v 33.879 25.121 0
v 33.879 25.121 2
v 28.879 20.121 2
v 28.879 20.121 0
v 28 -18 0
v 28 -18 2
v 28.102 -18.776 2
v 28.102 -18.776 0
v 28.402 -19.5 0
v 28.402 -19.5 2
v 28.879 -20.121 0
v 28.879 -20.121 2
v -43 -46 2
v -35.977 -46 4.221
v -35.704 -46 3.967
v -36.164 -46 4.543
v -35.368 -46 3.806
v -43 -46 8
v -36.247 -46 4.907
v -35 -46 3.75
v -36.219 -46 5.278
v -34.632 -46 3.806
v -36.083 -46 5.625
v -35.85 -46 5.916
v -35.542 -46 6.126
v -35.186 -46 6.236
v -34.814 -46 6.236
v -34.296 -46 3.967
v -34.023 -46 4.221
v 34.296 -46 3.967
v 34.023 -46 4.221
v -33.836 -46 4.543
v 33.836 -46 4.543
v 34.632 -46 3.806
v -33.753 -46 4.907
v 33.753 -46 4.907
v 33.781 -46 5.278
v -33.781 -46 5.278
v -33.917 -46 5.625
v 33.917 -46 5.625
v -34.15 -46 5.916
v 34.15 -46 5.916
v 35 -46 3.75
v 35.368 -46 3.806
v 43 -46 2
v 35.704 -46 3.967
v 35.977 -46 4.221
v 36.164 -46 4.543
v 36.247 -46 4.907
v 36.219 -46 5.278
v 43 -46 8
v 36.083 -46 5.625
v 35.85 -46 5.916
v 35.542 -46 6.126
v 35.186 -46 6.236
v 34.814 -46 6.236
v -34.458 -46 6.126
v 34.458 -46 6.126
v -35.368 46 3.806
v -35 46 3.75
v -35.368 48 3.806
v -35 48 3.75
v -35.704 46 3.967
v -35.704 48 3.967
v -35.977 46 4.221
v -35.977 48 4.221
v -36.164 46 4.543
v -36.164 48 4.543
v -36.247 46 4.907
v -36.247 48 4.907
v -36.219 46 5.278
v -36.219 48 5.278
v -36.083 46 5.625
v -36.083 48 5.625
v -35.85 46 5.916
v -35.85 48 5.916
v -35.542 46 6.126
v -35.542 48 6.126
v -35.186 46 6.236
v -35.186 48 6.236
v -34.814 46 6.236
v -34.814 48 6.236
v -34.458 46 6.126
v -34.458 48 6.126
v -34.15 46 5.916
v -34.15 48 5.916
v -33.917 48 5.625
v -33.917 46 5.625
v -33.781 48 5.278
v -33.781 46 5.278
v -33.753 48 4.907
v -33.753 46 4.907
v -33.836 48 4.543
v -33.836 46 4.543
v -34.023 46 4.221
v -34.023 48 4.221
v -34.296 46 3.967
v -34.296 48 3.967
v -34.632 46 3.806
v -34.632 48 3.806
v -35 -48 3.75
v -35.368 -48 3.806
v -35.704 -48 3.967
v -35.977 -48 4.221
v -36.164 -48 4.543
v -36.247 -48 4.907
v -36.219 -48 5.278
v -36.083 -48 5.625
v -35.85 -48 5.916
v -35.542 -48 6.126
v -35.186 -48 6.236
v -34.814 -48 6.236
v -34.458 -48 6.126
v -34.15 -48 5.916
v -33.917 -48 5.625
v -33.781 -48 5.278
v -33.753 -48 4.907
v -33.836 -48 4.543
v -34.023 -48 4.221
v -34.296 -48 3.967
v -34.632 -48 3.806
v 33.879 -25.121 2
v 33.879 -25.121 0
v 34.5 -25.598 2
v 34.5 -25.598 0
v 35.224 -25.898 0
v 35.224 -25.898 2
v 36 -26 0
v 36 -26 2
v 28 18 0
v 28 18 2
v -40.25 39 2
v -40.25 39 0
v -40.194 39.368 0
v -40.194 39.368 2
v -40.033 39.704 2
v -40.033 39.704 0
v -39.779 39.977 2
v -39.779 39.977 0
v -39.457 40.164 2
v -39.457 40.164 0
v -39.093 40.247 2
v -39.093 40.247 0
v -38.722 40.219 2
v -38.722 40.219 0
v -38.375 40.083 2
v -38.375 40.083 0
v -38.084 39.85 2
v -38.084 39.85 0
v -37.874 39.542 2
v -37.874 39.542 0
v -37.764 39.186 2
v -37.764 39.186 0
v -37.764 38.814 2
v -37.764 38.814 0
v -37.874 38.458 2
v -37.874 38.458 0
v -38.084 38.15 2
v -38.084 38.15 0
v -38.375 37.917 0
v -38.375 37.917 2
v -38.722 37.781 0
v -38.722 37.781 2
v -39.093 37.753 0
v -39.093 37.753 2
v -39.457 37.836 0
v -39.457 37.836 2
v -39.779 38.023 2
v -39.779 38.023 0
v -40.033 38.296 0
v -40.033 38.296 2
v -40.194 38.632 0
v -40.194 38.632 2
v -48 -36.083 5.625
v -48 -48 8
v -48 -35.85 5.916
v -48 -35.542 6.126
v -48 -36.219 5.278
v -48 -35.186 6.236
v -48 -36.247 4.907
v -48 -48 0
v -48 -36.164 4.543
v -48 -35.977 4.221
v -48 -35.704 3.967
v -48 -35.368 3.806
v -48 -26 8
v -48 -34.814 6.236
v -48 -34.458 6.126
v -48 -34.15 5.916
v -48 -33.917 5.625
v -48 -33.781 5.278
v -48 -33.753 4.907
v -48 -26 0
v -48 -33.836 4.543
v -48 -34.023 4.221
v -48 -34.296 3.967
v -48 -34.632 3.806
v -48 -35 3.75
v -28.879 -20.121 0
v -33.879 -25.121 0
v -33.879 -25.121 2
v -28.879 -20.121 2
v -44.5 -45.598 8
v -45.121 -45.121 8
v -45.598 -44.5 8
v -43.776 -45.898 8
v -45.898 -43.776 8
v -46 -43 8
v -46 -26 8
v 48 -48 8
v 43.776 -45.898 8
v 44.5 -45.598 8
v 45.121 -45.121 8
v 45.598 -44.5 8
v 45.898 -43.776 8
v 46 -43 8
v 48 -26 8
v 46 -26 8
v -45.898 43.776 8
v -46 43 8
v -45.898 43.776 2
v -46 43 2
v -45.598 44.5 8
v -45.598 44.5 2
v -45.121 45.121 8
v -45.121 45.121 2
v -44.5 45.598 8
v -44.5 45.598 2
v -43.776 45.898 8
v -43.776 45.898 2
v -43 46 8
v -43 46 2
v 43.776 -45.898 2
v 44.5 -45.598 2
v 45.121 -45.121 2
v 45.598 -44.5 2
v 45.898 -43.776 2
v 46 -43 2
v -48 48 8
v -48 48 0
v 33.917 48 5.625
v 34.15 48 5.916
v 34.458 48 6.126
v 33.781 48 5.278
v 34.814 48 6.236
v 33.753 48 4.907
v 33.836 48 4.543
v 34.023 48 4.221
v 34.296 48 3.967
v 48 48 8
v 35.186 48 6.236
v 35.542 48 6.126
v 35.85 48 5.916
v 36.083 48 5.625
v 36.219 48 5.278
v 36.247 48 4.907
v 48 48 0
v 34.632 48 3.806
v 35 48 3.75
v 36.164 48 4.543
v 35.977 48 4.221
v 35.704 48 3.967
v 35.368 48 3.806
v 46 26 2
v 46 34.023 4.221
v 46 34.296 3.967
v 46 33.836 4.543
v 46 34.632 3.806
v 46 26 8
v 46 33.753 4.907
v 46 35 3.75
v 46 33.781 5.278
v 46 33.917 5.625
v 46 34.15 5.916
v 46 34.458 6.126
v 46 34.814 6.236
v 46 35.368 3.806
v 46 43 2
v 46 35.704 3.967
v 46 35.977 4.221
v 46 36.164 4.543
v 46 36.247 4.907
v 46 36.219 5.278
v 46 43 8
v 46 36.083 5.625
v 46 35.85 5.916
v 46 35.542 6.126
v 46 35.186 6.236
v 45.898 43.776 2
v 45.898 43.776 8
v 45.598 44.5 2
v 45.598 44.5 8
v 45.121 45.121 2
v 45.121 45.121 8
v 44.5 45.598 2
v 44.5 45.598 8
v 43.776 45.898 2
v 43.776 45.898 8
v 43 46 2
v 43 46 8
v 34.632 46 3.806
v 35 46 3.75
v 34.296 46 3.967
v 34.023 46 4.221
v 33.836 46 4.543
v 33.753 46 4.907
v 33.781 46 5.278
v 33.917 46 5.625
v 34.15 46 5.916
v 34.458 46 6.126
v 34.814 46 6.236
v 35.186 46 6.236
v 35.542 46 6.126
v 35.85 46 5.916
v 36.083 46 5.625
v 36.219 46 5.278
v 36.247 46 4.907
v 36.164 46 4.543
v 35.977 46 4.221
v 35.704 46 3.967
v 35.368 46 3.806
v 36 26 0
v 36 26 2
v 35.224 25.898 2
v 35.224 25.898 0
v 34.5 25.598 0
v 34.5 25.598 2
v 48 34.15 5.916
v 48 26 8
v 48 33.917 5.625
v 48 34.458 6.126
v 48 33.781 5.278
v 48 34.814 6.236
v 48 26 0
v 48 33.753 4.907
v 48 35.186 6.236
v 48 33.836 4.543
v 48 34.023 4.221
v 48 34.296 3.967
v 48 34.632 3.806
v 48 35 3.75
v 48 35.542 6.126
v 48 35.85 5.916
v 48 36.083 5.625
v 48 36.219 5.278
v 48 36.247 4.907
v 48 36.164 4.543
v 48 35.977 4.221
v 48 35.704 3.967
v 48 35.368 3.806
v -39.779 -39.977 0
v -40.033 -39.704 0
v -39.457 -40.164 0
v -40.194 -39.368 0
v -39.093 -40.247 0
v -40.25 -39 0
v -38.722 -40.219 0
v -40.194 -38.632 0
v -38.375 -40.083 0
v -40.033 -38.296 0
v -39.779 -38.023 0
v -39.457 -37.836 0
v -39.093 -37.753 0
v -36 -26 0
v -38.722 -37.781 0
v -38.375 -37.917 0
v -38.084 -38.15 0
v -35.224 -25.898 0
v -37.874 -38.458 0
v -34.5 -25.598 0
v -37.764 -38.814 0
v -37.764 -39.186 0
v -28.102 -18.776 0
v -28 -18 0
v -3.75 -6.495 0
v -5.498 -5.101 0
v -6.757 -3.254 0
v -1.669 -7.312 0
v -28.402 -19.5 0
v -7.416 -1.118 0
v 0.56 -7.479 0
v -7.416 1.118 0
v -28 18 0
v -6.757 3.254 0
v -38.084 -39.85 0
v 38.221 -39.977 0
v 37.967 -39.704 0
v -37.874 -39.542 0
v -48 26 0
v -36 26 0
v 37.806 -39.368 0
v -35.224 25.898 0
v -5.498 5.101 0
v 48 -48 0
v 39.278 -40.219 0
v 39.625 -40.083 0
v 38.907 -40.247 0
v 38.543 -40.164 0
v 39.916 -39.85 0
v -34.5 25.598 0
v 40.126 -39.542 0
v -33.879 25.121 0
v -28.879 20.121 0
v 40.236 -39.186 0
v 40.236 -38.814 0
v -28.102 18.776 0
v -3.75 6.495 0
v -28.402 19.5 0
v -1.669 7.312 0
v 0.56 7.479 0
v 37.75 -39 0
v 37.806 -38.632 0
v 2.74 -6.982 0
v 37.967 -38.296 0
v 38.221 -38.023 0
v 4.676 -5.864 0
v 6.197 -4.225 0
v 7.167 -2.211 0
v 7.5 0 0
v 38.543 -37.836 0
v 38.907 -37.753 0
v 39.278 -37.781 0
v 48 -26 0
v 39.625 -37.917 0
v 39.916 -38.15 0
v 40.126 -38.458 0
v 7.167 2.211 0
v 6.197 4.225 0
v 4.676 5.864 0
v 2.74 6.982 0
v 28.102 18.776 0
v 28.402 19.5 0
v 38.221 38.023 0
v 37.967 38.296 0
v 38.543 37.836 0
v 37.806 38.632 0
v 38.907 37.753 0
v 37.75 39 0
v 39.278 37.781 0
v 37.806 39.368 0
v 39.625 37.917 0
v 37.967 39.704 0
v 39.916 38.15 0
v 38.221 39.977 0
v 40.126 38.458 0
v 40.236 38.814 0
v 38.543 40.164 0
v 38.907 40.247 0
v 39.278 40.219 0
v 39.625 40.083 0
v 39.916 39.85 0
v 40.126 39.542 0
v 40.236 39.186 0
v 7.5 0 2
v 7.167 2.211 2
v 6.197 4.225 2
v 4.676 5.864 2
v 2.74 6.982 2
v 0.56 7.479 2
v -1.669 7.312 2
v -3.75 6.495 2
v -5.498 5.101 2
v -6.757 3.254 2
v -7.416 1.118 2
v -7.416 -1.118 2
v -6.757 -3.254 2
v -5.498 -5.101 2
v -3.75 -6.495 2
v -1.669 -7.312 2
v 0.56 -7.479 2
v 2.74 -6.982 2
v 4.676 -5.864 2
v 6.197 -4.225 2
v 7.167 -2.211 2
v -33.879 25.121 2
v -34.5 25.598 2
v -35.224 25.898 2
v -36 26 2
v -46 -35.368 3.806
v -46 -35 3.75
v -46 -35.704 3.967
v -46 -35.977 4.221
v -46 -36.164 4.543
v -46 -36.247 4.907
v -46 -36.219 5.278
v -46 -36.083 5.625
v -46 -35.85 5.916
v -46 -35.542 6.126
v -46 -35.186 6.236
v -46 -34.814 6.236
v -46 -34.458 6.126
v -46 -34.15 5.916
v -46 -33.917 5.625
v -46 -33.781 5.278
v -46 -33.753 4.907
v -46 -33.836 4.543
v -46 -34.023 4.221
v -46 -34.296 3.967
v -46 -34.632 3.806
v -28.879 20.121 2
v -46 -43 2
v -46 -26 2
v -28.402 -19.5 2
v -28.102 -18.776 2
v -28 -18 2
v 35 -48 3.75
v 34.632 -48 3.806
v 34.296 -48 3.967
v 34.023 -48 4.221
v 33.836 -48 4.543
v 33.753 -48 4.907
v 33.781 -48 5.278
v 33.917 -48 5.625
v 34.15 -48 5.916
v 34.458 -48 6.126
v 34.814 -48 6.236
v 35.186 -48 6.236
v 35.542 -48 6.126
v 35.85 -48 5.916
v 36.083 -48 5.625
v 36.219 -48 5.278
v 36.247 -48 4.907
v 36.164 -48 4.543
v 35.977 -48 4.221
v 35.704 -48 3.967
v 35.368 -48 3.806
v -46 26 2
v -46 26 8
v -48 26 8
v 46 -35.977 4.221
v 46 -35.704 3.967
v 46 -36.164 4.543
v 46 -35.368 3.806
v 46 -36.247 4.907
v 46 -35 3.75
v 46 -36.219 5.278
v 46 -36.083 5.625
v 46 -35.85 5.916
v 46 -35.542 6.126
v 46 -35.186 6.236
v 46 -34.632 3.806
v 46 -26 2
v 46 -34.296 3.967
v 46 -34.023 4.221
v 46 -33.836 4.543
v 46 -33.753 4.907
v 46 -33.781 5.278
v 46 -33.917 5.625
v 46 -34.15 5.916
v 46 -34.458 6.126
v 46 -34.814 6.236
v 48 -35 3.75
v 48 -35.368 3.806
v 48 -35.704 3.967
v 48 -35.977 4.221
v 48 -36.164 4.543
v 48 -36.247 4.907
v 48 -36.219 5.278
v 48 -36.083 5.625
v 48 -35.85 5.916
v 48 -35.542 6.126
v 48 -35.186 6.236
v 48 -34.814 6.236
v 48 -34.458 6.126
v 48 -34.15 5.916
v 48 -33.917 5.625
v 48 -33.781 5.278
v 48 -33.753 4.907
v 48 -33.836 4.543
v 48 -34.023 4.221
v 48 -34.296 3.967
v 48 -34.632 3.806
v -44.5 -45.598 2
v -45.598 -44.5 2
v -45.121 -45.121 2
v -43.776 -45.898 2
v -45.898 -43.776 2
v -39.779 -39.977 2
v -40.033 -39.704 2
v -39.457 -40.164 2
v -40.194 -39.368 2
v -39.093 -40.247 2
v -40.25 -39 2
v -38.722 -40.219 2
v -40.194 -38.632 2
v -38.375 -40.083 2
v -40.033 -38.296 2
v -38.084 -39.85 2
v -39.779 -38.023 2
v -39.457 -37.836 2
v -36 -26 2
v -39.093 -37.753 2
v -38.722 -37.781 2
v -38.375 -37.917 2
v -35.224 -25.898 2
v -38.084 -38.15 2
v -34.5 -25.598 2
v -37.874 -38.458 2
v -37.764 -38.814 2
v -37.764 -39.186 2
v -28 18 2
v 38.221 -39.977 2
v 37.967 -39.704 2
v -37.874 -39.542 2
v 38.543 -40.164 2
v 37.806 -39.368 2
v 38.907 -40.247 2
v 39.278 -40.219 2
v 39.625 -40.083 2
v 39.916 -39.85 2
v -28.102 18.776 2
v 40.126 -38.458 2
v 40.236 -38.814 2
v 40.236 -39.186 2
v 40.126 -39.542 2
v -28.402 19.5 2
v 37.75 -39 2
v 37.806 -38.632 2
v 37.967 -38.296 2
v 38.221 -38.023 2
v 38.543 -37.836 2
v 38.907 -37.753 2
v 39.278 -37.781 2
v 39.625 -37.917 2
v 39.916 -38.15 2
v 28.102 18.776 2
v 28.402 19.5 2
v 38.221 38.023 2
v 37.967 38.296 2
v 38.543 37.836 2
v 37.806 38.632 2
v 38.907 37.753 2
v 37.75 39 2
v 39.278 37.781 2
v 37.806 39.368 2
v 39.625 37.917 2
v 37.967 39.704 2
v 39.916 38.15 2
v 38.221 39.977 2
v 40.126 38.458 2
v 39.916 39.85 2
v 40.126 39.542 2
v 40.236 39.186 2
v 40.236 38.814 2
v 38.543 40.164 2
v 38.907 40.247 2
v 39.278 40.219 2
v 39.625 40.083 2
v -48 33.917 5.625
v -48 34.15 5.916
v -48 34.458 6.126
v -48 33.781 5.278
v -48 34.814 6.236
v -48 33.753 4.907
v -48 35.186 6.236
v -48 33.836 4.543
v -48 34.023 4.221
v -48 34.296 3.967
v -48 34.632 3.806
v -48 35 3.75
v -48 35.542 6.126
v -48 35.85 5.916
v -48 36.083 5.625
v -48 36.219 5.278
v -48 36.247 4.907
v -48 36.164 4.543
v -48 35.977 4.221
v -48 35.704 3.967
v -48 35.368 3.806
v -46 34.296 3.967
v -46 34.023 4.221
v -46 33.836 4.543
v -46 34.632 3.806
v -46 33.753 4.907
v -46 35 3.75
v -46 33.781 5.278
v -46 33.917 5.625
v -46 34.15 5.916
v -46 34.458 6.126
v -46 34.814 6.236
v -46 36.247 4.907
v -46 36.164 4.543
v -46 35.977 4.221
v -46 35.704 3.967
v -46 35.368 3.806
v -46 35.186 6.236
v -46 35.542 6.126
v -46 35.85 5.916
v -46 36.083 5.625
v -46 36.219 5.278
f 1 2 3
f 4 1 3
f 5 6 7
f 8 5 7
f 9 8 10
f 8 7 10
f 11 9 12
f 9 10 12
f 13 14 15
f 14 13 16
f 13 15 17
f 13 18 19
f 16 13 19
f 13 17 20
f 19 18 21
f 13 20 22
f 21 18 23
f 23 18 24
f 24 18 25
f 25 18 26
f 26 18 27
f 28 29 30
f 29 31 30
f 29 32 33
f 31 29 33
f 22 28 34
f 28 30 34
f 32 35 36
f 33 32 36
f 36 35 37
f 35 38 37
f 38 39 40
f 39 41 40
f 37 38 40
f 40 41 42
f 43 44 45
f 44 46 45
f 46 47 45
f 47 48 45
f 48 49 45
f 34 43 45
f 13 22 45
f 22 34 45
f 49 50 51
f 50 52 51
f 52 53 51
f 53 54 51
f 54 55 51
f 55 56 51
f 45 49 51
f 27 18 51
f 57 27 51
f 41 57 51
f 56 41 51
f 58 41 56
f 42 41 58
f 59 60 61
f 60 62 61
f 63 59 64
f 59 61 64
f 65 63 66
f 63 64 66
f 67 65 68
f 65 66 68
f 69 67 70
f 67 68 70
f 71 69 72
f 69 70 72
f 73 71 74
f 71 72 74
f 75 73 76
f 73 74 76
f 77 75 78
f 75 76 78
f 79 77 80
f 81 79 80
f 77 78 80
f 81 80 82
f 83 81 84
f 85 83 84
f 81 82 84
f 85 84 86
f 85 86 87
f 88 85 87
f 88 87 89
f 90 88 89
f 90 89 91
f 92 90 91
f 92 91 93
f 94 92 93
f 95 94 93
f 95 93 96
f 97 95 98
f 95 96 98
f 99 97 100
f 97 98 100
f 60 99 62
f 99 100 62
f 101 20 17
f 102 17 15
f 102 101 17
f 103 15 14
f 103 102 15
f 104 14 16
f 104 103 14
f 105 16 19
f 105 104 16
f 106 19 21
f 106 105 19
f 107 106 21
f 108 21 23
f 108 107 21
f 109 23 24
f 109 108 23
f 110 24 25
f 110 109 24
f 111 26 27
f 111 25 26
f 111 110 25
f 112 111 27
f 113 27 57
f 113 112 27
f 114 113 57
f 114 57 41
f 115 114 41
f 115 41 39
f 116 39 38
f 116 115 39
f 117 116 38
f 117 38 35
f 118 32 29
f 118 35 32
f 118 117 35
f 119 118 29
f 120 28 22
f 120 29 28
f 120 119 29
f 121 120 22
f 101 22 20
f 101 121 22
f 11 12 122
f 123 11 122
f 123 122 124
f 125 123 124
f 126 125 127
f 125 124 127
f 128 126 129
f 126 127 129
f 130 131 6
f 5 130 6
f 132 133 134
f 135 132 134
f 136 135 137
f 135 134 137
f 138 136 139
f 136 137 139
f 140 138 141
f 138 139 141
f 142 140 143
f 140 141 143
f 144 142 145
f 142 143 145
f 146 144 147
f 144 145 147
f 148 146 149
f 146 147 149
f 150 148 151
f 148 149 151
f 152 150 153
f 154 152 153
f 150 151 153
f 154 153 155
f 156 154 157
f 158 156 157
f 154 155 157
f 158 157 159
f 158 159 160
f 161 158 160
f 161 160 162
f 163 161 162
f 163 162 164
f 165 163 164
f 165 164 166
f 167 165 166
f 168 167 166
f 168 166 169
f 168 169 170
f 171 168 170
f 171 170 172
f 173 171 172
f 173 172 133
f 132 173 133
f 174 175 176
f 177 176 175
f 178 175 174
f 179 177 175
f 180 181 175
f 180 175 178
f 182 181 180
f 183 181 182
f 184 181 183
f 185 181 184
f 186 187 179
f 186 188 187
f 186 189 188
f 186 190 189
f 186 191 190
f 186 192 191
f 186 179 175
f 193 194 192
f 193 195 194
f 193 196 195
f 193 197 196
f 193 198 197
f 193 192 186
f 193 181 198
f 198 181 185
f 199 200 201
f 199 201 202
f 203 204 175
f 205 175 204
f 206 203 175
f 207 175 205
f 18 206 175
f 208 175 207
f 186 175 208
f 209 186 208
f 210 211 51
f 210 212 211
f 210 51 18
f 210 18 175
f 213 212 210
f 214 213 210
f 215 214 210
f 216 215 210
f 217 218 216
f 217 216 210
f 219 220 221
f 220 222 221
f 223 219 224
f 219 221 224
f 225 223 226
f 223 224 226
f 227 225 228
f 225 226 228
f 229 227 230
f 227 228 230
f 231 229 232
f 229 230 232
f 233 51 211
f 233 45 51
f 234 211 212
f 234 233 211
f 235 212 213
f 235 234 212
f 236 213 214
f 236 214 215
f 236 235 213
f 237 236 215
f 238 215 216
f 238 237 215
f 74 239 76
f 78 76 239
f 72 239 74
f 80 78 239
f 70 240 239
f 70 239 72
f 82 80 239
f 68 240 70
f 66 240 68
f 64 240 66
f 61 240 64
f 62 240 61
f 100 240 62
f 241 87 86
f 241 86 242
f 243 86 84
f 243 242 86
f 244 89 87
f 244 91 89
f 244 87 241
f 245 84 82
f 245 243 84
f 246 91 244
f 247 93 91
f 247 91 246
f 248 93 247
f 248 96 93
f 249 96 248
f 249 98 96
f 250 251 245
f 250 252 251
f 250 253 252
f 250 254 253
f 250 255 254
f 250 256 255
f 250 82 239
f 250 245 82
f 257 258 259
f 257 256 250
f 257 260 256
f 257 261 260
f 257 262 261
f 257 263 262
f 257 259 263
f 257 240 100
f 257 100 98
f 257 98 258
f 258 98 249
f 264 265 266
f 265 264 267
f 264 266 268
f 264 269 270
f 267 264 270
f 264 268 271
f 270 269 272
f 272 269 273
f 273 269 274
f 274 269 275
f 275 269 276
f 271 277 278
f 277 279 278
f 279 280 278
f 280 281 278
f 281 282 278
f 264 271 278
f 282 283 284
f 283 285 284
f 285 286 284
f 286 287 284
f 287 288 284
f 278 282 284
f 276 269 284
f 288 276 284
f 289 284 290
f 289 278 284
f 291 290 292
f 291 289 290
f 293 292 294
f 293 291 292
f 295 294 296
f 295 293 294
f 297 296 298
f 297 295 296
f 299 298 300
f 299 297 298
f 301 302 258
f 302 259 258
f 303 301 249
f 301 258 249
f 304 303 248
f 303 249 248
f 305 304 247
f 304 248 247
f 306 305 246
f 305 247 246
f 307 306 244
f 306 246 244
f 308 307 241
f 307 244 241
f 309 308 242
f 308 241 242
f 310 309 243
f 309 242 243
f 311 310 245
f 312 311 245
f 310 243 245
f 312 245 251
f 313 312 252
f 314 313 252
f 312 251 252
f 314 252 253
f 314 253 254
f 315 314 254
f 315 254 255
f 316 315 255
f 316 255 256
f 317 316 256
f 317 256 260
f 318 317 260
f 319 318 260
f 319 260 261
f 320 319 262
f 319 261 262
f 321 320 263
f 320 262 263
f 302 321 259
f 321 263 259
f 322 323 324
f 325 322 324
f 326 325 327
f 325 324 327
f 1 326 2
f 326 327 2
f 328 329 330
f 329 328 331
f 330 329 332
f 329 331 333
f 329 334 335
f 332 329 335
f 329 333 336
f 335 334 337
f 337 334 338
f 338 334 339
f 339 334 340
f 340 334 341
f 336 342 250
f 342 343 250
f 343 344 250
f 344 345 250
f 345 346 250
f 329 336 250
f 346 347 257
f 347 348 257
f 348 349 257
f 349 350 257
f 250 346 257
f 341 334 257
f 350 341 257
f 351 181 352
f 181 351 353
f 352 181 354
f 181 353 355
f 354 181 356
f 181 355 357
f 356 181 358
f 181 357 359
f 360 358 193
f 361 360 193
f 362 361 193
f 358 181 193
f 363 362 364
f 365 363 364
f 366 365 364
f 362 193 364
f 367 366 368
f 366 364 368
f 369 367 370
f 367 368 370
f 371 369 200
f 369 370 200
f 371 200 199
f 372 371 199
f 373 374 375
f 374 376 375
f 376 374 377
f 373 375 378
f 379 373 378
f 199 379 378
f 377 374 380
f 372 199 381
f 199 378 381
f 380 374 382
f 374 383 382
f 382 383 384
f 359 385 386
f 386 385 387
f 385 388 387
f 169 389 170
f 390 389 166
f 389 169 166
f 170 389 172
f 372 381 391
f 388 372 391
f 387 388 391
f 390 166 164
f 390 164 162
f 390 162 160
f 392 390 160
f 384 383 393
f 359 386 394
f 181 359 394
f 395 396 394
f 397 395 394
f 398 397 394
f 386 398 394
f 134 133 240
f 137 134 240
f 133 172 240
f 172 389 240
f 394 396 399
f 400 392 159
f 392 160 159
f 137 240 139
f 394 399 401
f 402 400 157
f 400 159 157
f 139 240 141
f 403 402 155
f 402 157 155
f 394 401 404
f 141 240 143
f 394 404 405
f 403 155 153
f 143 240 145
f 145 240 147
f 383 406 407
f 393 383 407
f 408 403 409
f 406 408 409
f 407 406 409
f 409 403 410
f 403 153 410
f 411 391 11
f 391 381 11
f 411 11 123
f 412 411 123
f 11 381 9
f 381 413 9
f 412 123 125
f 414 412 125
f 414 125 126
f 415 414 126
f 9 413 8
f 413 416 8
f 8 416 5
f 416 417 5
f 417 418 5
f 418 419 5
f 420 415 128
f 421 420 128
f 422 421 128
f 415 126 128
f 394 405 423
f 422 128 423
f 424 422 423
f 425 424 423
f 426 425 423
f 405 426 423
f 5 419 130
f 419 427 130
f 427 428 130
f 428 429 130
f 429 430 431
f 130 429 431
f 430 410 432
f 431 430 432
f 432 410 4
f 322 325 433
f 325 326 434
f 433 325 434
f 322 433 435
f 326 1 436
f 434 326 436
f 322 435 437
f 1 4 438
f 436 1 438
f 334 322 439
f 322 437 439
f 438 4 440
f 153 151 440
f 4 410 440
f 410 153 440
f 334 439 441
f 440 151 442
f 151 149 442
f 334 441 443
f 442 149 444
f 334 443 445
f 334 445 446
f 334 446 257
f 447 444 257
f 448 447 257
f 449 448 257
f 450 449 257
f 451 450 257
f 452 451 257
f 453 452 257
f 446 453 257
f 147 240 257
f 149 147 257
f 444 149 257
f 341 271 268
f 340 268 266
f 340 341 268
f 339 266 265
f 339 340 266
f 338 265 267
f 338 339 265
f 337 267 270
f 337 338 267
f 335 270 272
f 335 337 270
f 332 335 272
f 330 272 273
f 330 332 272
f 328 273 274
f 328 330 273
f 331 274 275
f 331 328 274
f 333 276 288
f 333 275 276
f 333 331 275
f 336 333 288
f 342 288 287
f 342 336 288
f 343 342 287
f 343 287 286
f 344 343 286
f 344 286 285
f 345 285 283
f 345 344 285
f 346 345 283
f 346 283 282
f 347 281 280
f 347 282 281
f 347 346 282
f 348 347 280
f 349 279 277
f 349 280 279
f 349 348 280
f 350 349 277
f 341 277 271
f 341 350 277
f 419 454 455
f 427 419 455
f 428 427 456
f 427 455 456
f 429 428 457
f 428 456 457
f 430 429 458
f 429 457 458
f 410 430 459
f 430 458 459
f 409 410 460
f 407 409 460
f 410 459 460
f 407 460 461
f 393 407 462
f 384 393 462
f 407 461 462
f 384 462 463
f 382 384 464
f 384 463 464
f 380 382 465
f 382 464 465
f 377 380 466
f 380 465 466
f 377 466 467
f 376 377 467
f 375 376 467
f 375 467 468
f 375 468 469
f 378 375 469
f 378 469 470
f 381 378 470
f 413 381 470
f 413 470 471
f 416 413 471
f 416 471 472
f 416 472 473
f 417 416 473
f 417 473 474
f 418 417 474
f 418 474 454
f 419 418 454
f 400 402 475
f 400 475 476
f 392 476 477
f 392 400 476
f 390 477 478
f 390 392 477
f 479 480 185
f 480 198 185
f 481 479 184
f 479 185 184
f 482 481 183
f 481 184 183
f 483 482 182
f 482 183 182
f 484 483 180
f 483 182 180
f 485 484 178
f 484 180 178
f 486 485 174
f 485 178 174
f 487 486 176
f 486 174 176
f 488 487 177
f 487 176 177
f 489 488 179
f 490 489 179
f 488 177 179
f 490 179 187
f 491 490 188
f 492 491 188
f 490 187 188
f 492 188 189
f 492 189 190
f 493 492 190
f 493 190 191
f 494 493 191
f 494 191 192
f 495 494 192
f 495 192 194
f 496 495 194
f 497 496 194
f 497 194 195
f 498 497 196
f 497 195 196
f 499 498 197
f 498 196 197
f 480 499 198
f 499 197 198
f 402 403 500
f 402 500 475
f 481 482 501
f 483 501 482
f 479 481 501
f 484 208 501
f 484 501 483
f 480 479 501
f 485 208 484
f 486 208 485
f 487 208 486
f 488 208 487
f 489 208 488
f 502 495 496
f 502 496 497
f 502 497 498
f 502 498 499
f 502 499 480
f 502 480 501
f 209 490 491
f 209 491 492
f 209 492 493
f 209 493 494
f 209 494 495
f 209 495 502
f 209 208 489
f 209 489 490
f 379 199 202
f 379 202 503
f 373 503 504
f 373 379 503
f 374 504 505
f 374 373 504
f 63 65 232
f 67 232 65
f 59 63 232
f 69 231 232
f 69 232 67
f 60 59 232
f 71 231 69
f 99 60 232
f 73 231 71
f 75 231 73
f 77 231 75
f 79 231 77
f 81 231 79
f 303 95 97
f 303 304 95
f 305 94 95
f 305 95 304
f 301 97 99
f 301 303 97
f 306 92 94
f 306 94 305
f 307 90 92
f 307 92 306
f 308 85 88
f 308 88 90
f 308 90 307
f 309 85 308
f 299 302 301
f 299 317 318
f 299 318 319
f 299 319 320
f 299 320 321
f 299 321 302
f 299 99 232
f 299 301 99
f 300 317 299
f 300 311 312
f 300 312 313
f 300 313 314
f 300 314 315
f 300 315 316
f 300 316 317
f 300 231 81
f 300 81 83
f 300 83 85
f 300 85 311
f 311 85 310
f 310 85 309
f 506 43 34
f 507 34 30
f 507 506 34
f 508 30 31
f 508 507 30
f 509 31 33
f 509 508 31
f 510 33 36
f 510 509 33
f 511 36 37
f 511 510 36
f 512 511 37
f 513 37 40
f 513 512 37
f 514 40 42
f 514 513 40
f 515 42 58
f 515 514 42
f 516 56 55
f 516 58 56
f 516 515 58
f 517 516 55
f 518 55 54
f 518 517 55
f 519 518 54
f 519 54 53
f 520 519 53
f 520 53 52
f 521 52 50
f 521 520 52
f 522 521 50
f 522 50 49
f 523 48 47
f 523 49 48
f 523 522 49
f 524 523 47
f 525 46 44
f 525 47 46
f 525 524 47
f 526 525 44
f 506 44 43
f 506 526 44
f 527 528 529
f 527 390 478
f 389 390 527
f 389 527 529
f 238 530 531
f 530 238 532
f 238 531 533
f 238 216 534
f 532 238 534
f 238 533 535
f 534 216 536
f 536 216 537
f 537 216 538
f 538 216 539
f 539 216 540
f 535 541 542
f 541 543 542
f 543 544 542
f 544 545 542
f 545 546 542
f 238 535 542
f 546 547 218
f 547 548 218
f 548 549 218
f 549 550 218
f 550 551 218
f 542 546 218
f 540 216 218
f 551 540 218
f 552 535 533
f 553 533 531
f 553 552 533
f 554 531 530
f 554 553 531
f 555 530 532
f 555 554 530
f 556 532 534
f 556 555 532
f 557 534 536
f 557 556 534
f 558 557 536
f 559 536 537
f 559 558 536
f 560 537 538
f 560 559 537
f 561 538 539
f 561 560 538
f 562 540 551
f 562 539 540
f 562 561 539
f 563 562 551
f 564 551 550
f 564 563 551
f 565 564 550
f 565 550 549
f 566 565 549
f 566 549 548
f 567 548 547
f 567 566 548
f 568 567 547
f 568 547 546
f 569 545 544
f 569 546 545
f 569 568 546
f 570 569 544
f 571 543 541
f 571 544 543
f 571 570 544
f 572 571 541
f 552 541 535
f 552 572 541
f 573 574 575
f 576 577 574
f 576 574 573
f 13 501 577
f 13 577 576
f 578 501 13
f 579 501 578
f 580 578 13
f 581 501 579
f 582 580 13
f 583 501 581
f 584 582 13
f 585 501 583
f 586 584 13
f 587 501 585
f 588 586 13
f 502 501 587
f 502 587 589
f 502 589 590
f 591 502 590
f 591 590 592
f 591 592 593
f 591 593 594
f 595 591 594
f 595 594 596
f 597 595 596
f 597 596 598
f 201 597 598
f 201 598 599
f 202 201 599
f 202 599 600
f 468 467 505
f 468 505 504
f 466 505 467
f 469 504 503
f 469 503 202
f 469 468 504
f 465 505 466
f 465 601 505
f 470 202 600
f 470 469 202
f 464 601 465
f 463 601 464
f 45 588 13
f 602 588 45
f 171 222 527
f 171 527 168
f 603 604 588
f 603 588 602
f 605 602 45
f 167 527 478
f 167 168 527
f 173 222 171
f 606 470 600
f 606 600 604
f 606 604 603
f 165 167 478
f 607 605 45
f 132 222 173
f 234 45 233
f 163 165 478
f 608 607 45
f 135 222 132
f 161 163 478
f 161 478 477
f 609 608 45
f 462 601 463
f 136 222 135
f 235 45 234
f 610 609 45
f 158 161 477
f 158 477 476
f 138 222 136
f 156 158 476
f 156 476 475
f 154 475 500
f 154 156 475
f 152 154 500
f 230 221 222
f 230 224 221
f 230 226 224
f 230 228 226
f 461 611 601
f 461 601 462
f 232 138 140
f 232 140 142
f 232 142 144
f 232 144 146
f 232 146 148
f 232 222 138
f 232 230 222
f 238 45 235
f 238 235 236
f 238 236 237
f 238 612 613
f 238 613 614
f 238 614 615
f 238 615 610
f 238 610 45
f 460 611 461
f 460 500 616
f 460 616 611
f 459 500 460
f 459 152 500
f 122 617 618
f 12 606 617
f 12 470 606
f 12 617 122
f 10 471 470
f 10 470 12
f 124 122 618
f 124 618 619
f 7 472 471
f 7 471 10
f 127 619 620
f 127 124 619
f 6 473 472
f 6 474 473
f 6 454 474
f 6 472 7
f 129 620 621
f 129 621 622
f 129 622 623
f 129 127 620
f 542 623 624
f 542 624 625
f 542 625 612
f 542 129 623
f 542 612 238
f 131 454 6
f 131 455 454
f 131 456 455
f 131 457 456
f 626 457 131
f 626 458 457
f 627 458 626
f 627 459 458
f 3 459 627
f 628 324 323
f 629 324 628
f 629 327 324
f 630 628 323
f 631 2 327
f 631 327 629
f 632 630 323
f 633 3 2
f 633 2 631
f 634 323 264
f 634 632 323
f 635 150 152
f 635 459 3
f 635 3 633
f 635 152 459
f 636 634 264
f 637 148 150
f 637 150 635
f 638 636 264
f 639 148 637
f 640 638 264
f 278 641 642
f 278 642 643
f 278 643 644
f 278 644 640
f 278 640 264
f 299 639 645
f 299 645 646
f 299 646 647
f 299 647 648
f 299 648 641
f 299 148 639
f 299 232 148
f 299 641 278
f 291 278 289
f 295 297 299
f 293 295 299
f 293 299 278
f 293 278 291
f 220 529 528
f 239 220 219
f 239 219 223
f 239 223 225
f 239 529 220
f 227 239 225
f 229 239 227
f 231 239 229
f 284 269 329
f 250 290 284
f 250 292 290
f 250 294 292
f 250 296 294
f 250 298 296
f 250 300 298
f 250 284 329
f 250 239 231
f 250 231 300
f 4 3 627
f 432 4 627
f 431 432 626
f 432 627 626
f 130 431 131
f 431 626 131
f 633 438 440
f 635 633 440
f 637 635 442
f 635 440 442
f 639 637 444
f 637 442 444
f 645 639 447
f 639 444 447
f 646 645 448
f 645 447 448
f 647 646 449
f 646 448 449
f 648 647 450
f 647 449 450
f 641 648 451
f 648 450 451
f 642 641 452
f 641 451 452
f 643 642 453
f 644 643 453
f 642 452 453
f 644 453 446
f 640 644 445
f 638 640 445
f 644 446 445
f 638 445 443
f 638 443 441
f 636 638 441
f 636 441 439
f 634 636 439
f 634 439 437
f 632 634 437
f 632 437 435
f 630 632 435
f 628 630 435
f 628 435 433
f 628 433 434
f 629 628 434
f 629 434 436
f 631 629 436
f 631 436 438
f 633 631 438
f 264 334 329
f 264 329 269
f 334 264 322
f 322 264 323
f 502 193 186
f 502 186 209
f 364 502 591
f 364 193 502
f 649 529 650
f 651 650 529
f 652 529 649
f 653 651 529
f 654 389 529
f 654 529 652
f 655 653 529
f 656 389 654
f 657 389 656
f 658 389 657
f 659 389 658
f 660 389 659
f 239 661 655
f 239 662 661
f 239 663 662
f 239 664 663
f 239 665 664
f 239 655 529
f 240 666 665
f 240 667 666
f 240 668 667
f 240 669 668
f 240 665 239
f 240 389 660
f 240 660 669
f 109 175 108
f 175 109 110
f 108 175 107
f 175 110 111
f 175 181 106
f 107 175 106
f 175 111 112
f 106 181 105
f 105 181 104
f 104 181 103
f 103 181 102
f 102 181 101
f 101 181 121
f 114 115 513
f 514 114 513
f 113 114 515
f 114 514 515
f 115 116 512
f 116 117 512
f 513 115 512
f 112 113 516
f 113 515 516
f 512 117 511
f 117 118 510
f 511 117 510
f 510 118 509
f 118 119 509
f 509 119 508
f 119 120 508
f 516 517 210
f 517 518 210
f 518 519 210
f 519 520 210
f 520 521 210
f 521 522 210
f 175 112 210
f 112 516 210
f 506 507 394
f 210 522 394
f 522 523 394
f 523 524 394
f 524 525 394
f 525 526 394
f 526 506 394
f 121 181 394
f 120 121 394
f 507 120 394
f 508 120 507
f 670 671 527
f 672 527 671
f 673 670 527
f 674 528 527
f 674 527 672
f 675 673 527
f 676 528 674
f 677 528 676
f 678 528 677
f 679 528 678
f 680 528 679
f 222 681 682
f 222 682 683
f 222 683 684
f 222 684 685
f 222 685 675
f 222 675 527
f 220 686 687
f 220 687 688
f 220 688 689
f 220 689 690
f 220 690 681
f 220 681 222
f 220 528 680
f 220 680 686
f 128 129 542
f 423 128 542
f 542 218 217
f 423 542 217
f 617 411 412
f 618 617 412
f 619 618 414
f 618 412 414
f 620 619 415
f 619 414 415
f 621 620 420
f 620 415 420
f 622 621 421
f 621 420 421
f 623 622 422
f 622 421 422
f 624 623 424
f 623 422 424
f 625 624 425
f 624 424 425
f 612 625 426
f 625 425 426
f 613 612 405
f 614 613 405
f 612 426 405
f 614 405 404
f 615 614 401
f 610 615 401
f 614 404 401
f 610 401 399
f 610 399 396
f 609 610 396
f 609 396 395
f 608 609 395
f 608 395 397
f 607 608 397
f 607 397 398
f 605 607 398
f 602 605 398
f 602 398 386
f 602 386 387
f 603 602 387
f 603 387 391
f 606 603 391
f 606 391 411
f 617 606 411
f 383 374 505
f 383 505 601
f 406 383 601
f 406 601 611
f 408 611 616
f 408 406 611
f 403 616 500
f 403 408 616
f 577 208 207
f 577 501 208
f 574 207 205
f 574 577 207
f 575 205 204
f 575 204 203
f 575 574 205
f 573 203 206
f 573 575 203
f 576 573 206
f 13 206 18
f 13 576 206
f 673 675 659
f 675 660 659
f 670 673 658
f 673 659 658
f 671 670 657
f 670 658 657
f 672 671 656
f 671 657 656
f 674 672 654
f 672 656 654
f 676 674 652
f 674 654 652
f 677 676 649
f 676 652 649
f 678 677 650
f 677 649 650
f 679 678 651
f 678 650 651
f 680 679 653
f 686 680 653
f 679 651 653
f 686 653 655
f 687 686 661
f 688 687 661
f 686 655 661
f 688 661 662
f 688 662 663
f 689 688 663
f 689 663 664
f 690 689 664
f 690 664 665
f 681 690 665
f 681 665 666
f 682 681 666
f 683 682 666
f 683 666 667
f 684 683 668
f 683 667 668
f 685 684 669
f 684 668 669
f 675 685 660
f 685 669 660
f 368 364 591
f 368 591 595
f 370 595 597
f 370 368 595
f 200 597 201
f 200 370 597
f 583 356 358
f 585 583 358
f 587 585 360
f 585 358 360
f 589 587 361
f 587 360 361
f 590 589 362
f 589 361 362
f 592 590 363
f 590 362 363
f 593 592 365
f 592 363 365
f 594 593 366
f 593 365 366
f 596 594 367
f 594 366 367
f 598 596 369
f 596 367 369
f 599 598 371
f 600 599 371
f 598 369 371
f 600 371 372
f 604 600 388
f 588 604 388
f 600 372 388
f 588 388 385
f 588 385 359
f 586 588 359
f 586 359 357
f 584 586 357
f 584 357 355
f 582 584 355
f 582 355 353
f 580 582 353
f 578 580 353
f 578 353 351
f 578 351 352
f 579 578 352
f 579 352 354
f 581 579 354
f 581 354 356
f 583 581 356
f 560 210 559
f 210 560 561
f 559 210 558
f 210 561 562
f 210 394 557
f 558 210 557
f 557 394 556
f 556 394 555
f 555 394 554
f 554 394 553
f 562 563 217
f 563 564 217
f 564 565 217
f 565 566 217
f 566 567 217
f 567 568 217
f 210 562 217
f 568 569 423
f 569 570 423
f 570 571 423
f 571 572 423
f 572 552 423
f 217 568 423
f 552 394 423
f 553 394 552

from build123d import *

# Parameters (mm, degrees)
SKETCH1_W                      = 96
SKETCH1_H                      = 96
BOSS_EXTRUDE1_DEPTH            = 8
SKETCH2_W                      = 92
SKETCH2_H                      = 92
COMPONENT_PLATFORM_DEPTH       = 6
CABLE_SLOTS_DEPTH              = 6
SKETCH4_R                      = 7.5
CENTER_MASS_CUT_DEPTH          = 6
INNER_CORNER_FILLETS_R         = 3
M3X0_5_TAPPED_HOLE1_AT_2_COUNT = 2
M3X0_5_TAPPED_HOLE1_AT_2_PITCH = 70
M3X0_5_TAPPED_HOLE2_AT_2_COUNT = 2
M3X0_5_TAPPED_HOLE2_AT_2_PITCH = 70
M3X0_5_TAPPED_HOLE3_D          = 2.5
M3X0_5_TAPPED_HOLE3_DEPTH      = 10
M3X0_5_TAPPED_HOLE3_TIP        = 0.751075774


with BuildPart() as part:
    # Sketch1 → Boss-Extrude1 (new body)
    with BuildSketch(Plane.XY):
        Rectangle(SKETCH1_W, SKETCH1_H)
    extrude(amount=BOSS_EXTRUDE1_DEPTH)

    # Sketch2 → Component Platform (cut)
    with BuildSketch(Plane.XY.offset(8)):
        Rectangle(SKETCH2_W, SKETCH2_H)
    extrude(amount=-COMPONENT_PLATFORM_DEPTH, mode=Mode.SUBTRACT)

    # Sketch3 → Cable Slots (cut, symmetric)
    with BuildSketch(Plane.XY.offset(2)):
        with BuildLine():
            Line((-33.878679656, -25.121320344), (-28.878679656, -20.121320344))
            ThreePointArc((-28.878679656, -20.121320344), (-28.228361402, -19.148050297), (-28, -18))
            Line((-28, -18), (-28, 18))
            ThreePointArc((-28, 18), (-28.228361402, 19.148050297), (-28.878679656, 20.121320344))
            Line((-28.878679656, 20.121320344), (-33.878679656, 25.121320344))
            ThreePointArc((-33.878679656, 25.121320344), (-34.851949703, 25.771638598), (-36, 26))
            Line((-36, 26), (-48, 26))
            Line((-48, 26), (-48, -26))
            Line((-48, -26), (-36, -26))
            ThreePointArc((-36, -26), (-34.851949703, -25.771638598), (-33.878679656, -25.121320344))
        make_face()
        with BuildLine():
            Line((48, -26), (48, 26))
            Line((48, 26), (36, 26))
            ThreePointArc((36, 26), (34.851949703, 25.771638598), (33.878679656, 25.121320344))
            Line((33.878679656, 25.121320344), (28.878679656, 20.121320344))
            ThreePointArc((28.878679656, 20.121320344), (28.228361402, 19.148050297), (28, 18))
            Line((28, 18), (28, -18))
            ThreePointArc((28, -18), (28.228361402, -19.148050297), (28.878679656, -20.121320344))
            Line((28.878679656, -20.121320344), (33.878679656, -25.121320344))
            ThreePointArc((33.878679656, -25.121320344), (34.851949703, -25.771638598), (36, -26))
            Line((36, -26), (48, -26))
        make_face()
    extrude(amount=CABLE_SLOTS_DEPTH, both=True, mode=Mode.SUBTRACT)

    # Sketch4 → Center Mass Cut (cut)
    with BuildSketch(Plane.XY.offset(2)):
        Circle(SKETCH4_R)
    extrude(amount=-CENTER_MASS_CUT_DEPTH, mode=Mode.SUBTRACT)

    # Inner Corner Fillets
    inner_corner_fillets_edges = [part.edges().sort_by_distance(p)[0] for p in [
        (-46, -46, 5),
        (-46, 46, 5),
        (46, 46, 5),
        (46, -46, 5),
    ]]
    fillet(inner_corner_fillets_edges, radius=INNER_CORNER_FILLETS_R)

    # Sketch11 → M3x0.5 Tapped Hole1 (revolve, cut)
    with BuildSketch(Plane(origin=(-35, -48, 5), x_dir=(0, 0, -1), z_dir=(1, 0, 0))):
        Polygon((0, 0), (0, 10.751075774), (1.25, 10), (1.25, 0), align=None)
    m3x0_5_tapped_hole1 = revolve(axis=Axis((-35, -54.35, 5), (0, 1, 0)), mode=Mode.SUBTRACT)

    # M3x0.5 Tapped Hole1 at 2: M3x0.5 Tapped Hole1 ×2
    with Locations(*[(i * M3X0_5_TAPPED_HOLE1_AT_2_PITCH, 0, 0) for i in range(1, M3X0_5_TAPPED_HOLE1_AT_2_COUNT)]):
        add(m3x0_5_tapped_hole1, mode=Mode.SUBTRACT)

    # Sketch13 → M3x0.5 Tapped Hole2 (revolve, cut)
    with BuildSketch(Plane(origin=(48, -35, 5), x_dir=(0, 0, -1), z_dir=(0, 1, 0))):
        Polygon((0, 0), (0, 10.751075774), (1.25, 10), (1.25, 0), align=None)
    m3x0_5_tapped_hole2 = revolve(axis=Axis((54.35, -35, 5), (-1, 0, 0)), mode=Mode.SUBTRACT)

    # M3x0.5 Tapped Hole2 at 2: M3x0.5 Tapped Hole2 ×2
    with Locations(*[(0, i * M3X0_5_TAPPED_HOLE2_AT_2_PITCH, 0) for i in range(1, M3X0_5_TAPPED_HOLE2_AT_2_COUNT)]):
        add(m3x0_5_tapped_hole2, mode=Mode.SUBTRACT)

    # Mirror1: M3x0.5 Tapped Hole1 across plane
    add(m3x0_5_tapped_hole1.mirror(Plane(origin=(0, 0, 0), x_dir=(0, 0, 1), z_dir=(0, -1, 0))), mode=Mode.SUBTRACT)

    # Mirror1 copy 1 sketch → Mirror1 copy 1 (revolve, cut)
    with BuildSketch(Plane(origin=(35, 48, 5), x_dir=(0, 0, -1), z_dir=(1, 0, 0))):
        Polygon((0, 0), (0, -10.751075774), (1.25, -10), (1.25, 0), align=None)
    revolve(axis=Axis((35, 54.35, 5), (0, 1, 0)), mode=Mode.SUBTRACT)

    # Mirror2: M3x0.5 Tapped Hole2 across plane
    add(m3x0_5_tapped_hole2.mirror(Plane(origin=(0, 0, 0), x_dir=(0, 0, 1), z_dir=(1, 0, 0))), mode=Mode.SUBTRACT)

    # Mirror2 copy 1 sketch → Mirror2 copy 1 (revolve, cut)
    with BuildSketch(Plane(origin=(-48, 35, 5), x_dir=(0, 0, -1), z_dir=(0, 1, 0))):
        Polygon((0, 0), (0, -10.751075774), (1.25, -10), (1.25, 0), align=None)
    revolve(axis=Axis((-54.35, 35, 5), (-1, 0, 0)), mode=Mode.SUBTRACT)

    # M3x0.5 Tapped Hole3
    with Locations(Plane.XY.offset(2)):
        with Locations((-39, -39), (39, -39), (39, 39), (-39, 39)):
            Hole(M3X0_5_TAPPED_HOLE3_D / 2, depth=M3X0_5_TAPPED_HOLE3_DEPTH)
            with Locations((0, 0, -(M3X0_5_TAPPED_HOLE3_DEPTH + M3X0_5_TAPPED_HOLE3_TIP / 2))):  # 118° drill point
                Cone(0, M3X0_5_TAPPED_HOLE3_D / 2, M3X0_5_TAPPED_HOLE3_TIP, mode=Mode.SUBTRACT)


solid = part.part
